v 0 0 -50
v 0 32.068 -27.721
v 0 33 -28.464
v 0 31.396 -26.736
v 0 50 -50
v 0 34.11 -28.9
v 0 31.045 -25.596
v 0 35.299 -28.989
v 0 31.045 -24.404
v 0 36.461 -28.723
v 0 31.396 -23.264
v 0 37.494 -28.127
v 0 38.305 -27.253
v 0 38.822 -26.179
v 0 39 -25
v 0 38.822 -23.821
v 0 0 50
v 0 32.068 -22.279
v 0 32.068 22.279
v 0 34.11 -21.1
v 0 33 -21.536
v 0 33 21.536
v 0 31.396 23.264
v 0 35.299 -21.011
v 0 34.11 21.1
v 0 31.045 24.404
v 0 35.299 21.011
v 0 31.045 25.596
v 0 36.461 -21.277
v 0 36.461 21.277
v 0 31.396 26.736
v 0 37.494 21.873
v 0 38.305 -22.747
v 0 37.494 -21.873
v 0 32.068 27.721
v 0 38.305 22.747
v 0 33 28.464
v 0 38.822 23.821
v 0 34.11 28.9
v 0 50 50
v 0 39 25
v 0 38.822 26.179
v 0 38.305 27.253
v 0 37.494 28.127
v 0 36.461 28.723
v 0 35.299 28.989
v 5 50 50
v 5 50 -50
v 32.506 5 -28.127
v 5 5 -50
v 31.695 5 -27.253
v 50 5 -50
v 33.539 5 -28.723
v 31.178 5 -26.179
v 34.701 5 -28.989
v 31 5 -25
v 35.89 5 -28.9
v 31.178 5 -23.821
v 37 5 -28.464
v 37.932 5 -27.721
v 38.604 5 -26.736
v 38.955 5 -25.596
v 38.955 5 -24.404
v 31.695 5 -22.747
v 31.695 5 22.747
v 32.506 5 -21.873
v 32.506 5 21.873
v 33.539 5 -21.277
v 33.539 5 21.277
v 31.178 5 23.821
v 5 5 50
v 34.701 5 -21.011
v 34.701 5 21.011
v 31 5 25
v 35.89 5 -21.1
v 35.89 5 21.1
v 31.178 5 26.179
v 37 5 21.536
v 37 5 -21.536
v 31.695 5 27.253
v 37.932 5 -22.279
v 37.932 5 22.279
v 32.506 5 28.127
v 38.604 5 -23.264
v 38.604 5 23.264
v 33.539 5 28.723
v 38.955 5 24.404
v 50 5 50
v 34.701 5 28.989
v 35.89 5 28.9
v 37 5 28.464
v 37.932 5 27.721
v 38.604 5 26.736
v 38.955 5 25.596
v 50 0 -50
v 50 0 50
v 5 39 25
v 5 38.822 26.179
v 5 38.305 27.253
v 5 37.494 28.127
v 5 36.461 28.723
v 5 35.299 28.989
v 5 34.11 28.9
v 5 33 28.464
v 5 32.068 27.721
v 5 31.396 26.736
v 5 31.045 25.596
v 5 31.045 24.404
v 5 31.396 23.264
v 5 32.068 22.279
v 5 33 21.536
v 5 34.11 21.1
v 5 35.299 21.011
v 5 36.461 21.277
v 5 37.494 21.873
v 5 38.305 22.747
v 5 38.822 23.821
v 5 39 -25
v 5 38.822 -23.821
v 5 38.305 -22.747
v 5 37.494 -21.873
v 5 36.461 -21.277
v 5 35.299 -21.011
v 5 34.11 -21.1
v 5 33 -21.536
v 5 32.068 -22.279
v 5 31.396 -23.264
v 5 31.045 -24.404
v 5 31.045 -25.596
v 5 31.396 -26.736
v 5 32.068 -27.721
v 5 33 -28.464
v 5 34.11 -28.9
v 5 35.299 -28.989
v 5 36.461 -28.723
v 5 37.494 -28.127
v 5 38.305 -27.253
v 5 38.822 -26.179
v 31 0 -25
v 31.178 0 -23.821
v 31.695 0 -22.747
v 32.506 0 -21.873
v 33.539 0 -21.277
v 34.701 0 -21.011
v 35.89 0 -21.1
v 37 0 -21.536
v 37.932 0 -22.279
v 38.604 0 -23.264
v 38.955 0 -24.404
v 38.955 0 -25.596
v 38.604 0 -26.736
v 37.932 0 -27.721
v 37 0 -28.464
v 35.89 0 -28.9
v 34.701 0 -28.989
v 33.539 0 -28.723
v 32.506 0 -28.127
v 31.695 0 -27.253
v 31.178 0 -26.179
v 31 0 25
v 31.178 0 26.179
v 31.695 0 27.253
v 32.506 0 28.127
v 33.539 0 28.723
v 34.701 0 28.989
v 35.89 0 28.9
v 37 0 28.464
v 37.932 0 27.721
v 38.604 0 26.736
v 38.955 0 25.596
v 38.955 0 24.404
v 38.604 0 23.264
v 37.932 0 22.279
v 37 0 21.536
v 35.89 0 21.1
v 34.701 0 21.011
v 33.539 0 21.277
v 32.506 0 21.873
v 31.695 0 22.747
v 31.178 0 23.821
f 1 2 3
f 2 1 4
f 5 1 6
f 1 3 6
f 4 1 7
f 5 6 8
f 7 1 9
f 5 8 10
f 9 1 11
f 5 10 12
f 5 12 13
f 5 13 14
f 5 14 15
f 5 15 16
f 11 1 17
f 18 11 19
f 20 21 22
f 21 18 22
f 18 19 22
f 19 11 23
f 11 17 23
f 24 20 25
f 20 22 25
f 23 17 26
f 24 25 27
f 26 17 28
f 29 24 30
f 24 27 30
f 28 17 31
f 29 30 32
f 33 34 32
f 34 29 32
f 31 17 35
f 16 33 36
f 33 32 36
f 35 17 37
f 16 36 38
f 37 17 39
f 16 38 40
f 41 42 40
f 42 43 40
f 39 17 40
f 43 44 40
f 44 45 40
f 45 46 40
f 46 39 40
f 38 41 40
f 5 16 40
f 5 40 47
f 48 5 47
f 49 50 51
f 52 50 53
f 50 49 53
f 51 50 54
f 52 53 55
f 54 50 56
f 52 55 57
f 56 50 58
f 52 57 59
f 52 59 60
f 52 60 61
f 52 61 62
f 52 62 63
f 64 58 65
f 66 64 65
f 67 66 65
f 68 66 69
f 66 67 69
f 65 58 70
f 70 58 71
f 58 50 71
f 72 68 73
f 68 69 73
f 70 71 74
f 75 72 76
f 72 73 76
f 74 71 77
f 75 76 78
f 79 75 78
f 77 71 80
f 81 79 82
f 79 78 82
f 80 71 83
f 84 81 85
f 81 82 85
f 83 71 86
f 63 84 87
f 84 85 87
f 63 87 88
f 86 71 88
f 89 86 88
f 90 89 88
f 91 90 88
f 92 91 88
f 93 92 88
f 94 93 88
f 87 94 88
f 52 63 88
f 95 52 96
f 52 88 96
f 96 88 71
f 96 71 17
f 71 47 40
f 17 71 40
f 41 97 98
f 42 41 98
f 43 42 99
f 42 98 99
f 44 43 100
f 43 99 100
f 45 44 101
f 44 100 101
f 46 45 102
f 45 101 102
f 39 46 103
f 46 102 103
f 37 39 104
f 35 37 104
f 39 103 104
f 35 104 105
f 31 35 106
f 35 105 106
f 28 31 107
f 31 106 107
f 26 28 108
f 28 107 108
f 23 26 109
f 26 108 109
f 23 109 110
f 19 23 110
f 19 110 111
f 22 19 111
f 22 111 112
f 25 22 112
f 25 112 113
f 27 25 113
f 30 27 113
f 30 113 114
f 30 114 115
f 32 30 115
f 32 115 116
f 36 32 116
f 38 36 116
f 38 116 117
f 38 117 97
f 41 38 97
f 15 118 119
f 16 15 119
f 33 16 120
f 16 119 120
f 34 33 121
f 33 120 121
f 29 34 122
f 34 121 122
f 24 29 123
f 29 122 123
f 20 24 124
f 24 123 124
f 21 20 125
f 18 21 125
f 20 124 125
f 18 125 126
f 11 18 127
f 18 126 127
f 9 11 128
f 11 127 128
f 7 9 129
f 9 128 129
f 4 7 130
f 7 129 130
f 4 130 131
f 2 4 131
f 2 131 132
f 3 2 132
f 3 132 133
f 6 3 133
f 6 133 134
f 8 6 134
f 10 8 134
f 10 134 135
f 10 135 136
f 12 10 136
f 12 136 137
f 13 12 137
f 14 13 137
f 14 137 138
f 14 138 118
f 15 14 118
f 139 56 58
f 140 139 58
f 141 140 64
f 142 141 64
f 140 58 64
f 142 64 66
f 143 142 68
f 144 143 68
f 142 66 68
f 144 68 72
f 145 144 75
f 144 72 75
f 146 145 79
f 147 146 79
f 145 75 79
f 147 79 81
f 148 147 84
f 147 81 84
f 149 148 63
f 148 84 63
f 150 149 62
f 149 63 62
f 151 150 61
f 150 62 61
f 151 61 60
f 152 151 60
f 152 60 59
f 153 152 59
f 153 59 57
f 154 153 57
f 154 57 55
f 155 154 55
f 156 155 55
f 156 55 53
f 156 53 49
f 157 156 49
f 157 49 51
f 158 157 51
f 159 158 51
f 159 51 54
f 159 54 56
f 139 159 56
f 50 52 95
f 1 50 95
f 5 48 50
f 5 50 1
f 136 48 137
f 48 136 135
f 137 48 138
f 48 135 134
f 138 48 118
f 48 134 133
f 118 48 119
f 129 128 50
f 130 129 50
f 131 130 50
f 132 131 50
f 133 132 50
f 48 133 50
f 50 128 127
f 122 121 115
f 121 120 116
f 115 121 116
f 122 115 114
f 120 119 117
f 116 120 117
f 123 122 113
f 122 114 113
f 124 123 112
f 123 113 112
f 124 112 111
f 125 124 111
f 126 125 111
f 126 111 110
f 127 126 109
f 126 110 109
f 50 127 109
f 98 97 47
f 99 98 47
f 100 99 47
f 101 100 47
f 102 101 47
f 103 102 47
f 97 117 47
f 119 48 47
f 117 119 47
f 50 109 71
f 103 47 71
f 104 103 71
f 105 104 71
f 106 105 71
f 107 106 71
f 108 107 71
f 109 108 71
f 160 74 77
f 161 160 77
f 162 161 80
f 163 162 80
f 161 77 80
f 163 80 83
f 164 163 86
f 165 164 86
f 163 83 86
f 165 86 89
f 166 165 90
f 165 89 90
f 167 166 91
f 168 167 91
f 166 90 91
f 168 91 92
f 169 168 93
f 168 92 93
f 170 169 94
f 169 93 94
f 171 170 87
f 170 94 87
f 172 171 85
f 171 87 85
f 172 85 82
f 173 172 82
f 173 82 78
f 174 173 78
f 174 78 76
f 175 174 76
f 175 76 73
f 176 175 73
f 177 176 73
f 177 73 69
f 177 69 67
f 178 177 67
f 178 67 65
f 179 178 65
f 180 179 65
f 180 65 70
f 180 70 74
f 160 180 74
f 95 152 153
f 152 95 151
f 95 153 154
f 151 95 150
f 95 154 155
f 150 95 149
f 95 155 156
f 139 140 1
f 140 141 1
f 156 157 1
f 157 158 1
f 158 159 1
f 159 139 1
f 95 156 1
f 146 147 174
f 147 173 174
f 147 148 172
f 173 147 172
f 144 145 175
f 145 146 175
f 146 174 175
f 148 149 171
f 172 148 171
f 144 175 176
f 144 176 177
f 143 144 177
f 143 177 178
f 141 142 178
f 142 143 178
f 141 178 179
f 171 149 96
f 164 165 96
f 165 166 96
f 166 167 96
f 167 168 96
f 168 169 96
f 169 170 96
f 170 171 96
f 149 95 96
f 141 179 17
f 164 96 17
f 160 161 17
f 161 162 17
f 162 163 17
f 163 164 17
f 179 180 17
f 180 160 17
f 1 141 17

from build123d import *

# Parameters (mm, degrees)
BOSS_EXTRUDE1_DEPTH = 50
SKETCH3_R           = 4
CUT_EXTRUDE1_DEPTH  = 84.815273071
SKETCH2_R           = 4
CUT_EXTRUDE2_DEPTH  = 200


with BuildPart() as part:
    # Sketch1 → Boss-Extrude1 (new, symmetric)
    with BuildSketch(Plane.XY):
        Polygon((0, 50), (5, 50), (5, 5), (50, 5), (50, 0), (0, 0), align=None)
    extrude(amount=BOSS_EXTRUDE1_DEPTH, both=True)

    # Sketch3 → Cut-Extrude1 (cut, through all)
    with BuildSketch(Plane(origin=(0, 5, 0), x_dir=(1, 0, 0), z_dir=(0, 1, 0))):
        with Locations(Location((35, 25, 0), (0, 0, 180))):
            Circle(SKETCH3_R)
        with Locations(Location((35, -25, 0), (0, 0, 180))):
            Circle(SKETCH3_R)
    extrude(amount=-CUT_EXTRUDE1_DEPTH, mode=Mode.SUBTRACT)

    # Sketch2 → Cut-Extrude2 (cut)
    with BuildSketch(Plane(origin=(5, 0, 0), x_dir=(0, 0, -1), z_dir=(1, 0, 0))):
        with Locations(Location((-25, 35, 0), (0, 0, 90))):
            Circle(SKETCH2_R)
        with Locations(Location((25, 35, 0), (0, 0, 90))):
            Circle(SKETCH2_R)
    extrude(amount=-CUT_EXTRUDE2_DEPTH, mode=Mode.SUBTRACT)


solid = part.part
